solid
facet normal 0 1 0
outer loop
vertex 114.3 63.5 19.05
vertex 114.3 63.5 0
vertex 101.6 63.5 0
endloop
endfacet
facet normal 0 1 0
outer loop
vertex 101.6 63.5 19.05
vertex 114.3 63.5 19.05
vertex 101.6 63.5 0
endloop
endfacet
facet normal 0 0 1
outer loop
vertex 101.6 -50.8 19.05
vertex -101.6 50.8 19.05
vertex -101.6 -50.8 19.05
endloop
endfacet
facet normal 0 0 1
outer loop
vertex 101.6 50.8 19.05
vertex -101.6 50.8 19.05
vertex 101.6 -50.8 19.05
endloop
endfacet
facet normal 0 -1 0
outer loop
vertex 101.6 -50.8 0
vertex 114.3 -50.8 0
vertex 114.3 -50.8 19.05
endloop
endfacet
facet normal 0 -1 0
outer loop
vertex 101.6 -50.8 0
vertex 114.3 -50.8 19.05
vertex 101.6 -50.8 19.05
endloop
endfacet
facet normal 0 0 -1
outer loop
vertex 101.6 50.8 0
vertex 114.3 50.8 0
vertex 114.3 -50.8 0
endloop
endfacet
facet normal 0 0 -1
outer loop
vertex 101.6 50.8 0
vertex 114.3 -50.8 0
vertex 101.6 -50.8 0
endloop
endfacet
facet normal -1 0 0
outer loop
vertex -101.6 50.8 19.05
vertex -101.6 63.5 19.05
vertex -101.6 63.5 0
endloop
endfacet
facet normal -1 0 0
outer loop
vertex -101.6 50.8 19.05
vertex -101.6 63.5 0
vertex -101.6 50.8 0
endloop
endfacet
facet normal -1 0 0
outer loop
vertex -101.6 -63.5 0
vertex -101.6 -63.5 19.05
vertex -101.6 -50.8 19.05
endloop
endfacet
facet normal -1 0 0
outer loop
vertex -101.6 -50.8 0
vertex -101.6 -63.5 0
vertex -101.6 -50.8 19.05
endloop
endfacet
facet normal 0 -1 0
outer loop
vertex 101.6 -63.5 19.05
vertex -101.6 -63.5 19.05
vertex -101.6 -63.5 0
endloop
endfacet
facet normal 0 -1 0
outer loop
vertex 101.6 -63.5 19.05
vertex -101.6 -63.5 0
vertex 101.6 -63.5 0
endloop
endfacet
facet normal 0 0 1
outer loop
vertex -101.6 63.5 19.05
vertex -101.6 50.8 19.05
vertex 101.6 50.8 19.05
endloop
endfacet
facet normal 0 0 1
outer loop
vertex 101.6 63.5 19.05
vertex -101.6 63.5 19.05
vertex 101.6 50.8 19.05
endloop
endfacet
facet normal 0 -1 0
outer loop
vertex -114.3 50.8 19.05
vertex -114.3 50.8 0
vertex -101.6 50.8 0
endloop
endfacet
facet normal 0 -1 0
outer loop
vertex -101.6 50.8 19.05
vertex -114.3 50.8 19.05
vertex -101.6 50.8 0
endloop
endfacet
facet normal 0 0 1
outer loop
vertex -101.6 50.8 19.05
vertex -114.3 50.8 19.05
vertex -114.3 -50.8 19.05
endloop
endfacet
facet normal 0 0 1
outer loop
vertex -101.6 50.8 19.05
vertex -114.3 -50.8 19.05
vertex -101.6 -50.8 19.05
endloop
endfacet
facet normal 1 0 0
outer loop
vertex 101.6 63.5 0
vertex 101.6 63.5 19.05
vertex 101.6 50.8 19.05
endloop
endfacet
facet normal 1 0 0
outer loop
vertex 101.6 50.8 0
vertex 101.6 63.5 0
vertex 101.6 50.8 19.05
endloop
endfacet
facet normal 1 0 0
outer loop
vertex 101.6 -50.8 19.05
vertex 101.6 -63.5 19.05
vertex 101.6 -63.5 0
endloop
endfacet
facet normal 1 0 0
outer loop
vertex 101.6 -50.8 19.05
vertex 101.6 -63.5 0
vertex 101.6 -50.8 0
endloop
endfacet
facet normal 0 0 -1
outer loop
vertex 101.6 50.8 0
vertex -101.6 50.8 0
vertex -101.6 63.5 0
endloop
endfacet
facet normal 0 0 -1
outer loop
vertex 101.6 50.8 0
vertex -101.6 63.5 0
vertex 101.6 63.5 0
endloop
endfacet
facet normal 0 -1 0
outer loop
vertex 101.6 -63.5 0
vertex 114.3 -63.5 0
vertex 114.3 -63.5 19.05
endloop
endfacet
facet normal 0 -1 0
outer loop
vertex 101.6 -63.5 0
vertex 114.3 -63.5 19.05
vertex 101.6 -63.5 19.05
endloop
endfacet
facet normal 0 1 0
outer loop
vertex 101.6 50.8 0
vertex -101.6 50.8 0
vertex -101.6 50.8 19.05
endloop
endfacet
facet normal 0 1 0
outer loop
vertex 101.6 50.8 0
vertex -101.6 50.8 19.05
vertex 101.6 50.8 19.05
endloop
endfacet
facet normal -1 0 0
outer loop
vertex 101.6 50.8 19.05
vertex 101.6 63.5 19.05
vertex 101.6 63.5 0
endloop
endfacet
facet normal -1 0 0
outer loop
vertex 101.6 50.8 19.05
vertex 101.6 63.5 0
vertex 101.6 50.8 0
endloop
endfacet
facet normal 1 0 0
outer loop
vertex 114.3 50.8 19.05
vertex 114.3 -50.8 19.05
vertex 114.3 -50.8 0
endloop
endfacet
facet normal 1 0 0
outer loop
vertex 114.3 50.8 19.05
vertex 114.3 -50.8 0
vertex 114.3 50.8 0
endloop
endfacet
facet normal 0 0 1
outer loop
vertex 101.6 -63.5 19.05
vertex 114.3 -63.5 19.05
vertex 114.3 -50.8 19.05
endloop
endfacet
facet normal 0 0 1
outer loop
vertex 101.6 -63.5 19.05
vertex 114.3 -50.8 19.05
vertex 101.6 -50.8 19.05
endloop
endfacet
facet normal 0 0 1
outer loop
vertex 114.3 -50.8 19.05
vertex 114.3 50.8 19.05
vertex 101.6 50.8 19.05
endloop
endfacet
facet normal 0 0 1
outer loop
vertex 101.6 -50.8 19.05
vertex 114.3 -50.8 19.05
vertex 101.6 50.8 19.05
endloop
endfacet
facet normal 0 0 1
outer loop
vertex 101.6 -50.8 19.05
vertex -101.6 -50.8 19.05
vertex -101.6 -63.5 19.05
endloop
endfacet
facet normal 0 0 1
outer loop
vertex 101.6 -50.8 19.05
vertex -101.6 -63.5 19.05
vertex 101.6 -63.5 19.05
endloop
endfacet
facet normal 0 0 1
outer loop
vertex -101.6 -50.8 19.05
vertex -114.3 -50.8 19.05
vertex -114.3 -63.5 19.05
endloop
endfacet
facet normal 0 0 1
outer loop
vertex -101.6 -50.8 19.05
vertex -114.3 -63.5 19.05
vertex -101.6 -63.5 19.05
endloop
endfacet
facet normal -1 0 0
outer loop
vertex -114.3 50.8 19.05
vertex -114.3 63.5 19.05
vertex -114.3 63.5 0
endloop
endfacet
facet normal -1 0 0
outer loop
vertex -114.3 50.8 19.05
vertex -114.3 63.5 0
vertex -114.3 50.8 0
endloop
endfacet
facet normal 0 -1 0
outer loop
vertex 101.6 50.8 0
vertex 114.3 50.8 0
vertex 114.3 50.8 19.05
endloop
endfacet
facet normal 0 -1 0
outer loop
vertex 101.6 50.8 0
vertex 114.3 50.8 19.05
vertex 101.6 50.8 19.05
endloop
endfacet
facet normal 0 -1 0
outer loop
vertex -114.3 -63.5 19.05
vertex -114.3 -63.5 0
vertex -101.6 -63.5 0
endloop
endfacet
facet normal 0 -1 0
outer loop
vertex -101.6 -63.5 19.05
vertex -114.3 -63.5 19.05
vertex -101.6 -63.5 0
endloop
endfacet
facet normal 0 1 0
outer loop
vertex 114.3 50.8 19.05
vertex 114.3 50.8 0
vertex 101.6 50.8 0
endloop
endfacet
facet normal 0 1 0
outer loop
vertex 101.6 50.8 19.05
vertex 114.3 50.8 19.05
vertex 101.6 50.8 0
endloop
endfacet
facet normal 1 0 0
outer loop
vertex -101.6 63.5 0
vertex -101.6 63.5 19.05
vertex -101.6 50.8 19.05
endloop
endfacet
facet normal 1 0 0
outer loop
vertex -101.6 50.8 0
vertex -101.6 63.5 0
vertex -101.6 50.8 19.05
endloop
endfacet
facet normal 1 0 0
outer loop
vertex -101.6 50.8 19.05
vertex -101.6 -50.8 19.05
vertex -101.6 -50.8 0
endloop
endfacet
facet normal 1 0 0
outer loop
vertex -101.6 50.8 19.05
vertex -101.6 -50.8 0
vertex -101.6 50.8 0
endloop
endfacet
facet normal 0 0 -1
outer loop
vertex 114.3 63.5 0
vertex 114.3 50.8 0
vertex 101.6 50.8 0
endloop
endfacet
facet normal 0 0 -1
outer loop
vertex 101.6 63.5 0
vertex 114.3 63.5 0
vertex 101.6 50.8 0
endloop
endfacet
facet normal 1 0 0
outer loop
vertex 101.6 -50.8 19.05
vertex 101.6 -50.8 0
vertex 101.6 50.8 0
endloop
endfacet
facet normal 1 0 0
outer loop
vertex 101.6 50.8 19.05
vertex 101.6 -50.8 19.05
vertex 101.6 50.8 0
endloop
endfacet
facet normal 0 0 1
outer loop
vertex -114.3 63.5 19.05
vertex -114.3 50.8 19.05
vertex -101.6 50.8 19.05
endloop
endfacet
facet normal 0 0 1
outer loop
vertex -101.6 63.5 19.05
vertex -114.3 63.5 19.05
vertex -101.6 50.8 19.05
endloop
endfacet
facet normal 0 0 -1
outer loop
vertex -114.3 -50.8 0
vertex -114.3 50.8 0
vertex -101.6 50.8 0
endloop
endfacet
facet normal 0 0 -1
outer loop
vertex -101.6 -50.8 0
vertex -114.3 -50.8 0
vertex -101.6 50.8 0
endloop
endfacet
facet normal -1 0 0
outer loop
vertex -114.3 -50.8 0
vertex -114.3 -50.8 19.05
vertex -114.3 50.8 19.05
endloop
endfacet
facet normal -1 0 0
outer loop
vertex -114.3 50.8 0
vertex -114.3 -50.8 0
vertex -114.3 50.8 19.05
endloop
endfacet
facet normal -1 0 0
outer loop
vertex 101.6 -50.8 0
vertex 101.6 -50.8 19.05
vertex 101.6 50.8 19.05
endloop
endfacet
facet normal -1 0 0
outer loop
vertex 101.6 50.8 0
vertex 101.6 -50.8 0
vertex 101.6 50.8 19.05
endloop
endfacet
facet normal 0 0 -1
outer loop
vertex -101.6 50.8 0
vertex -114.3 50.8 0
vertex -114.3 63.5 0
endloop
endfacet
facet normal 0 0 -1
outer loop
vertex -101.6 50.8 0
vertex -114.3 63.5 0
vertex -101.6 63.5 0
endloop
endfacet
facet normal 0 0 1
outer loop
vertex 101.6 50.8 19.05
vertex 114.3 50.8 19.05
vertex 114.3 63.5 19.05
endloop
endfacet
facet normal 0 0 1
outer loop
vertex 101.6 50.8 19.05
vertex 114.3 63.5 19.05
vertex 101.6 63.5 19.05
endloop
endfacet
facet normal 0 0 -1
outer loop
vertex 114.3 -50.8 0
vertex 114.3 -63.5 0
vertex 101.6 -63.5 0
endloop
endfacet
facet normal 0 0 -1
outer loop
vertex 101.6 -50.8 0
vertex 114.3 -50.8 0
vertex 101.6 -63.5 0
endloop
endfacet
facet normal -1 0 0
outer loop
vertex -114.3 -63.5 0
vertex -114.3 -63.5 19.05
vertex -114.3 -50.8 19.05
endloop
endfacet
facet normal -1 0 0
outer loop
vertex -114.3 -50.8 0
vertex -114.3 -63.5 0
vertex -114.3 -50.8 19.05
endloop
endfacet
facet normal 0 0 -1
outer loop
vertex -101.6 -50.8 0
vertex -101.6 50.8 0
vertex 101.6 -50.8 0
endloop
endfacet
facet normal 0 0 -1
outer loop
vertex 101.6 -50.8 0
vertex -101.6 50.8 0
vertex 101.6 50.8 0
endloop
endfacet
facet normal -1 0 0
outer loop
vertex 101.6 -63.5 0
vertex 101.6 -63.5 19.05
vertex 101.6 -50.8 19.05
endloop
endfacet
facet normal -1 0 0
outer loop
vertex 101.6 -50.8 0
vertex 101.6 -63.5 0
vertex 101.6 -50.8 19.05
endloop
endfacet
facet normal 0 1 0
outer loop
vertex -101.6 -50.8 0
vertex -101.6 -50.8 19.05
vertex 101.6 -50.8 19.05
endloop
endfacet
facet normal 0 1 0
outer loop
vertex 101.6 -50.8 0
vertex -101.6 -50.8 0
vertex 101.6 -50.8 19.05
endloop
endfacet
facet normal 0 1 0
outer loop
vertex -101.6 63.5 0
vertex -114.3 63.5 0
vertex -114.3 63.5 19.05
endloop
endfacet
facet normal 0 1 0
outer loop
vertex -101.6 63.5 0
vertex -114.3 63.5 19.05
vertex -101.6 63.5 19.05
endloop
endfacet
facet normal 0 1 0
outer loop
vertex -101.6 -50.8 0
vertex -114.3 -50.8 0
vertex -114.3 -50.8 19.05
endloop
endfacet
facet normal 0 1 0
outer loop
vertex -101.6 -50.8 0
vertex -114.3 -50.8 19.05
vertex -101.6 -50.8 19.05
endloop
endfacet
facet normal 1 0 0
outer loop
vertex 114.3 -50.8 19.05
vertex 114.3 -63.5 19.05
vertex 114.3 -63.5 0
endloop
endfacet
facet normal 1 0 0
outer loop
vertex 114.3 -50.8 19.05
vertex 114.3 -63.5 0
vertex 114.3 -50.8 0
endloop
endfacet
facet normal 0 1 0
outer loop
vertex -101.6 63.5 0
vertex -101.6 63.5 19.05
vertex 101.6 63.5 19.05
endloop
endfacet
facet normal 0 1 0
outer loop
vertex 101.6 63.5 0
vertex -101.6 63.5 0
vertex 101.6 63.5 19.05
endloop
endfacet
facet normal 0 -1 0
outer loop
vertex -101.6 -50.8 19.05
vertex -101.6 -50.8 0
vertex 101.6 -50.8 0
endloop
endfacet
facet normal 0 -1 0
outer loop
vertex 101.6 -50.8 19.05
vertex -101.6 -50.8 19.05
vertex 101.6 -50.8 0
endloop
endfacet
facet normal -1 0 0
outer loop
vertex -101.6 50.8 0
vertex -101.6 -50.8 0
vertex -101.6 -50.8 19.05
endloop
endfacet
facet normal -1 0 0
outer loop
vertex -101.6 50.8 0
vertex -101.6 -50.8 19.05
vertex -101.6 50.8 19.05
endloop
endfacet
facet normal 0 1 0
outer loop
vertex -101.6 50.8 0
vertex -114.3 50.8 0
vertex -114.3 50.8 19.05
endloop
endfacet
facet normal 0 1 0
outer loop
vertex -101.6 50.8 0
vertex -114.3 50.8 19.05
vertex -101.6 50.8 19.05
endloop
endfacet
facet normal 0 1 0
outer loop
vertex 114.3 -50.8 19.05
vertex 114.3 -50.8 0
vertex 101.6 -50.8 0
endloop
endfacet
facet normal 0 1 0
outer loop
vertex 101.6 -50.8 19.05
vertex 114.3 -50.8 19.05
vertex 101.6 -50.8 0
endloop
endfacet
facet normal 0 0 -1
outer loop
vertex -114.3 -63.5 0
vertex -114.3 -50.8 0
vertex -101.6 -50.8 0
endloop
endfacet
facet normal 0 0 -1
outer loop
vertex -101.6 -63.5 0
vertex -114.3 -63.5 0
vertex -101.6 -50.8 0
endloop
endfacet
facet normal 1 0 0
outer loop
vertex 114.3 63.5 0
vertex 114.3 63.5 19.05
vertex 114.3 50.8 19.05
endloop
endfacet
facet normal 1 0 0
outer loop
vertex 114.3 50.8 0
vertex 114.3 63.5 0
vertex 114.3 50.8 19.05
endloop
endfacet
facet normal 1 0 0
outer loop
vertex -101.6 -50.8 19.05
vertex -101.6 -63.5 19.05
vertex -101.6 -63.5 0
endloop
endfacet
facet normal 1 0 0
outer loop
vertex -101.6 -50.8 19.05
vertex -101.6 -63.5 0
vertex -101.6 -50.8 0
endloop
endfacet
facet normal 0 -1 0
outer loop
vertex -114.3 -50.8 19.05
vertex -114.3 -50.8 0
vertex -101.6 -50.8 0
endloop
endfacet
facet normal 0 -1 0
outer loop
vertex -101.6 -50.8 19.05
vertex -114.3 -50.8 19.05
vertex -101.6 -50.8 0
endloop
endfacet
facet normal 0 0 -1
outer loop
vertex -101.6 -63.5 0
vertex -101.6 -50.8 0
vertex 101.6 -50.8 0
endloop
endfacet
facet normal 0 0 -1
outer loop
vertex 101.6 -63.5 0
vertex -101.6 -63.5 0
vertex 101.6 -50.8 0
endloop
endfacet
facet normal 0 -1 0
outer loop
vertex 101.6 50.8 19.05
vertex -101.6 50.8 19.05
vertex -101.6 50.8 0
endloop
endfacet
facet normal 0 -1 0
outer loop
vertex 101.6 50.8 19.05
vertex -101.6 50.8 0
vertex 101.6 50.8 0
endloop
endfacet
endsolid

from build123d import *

# Parameters (mm, degrees)
F0_W      = 203.2
F0_H      = 101.6
F1_DEPTH  = 19.05
F2_W      = 12.7
F2_H      = 12.7
F3_DEPTH  = 19.05
F6_W      = 203.2
F6_H      = 12.7
F7_DEPTH  = 19.05
F9_W      = 12.7
F9_H      = 101.6
F10_DEPTH = 19.05


# Not quite as in the source:
# - a length typed as a fraction of an inch, garbled in the dataset ("3 / 203.2 mm" for 3/8 in), is restored


with BuildPart() as f1:
    # F0 (on Top) → F1 (new body)
    with BuildSketch(Plane.XY):
        Rectangle(F0_W, F0_H)
    extrude(amount=F1_DEPTH)


with BuildPart() as f3:
    # F2 (on face) → F3 (new body)
    with BuildSketch(Plane.XY.offset(19.05)):
        with Locations((-107.95, -57.15)):
            Rectangle(F2_W, F2_H)
    extrude(amount=-F3_DEPTH)


with BuildPart() as f4_1:
    # F4: instance of F3
    add(f3.part.mirror(Plane.YZ))


with BuildPart() as f5_1:
    # F5: instance of F3
    add(f3.part.mirror(Plane.XZ))


with BuildPart() as f5_2:
    # F5: instance of F4_1
    add(f4_1.part.mirror(Plane.XZ))


with BuildPart() as f7:
    # F6 (on face) → F7 (new body)
    with BuildSketch(Plane.XY.offset(19.05)):
        with Locations((0, -57.15)):
            Rectangle(F6_W, F6_H)
    extrude(amount=-F7_DEPTH)


with BuildPart() as f8_1:
    # F8: instance of F7
    add(f7.part.mirror(Plane.XZ))


with BuildPart() as f10:
    # F9 (on face) → F10 (new body)
    with BuildSketch(Plane.XY.offset(19.05)):
        with Locations((-107.95, 0)):
            Rectangle(F9_W, F9_H)
    extrude(amount=-F10_DEPTH)


with BuildPart() as f11_1:
    # F11: instance of F10
    add(f10.part.mirror(Plane.YZ))


solid = Compound([f1.part, f3.part, f4_1.part, f5_1.part, f5_2.part, f7.part, f8_1.part, f10.part, f11_1.part])
